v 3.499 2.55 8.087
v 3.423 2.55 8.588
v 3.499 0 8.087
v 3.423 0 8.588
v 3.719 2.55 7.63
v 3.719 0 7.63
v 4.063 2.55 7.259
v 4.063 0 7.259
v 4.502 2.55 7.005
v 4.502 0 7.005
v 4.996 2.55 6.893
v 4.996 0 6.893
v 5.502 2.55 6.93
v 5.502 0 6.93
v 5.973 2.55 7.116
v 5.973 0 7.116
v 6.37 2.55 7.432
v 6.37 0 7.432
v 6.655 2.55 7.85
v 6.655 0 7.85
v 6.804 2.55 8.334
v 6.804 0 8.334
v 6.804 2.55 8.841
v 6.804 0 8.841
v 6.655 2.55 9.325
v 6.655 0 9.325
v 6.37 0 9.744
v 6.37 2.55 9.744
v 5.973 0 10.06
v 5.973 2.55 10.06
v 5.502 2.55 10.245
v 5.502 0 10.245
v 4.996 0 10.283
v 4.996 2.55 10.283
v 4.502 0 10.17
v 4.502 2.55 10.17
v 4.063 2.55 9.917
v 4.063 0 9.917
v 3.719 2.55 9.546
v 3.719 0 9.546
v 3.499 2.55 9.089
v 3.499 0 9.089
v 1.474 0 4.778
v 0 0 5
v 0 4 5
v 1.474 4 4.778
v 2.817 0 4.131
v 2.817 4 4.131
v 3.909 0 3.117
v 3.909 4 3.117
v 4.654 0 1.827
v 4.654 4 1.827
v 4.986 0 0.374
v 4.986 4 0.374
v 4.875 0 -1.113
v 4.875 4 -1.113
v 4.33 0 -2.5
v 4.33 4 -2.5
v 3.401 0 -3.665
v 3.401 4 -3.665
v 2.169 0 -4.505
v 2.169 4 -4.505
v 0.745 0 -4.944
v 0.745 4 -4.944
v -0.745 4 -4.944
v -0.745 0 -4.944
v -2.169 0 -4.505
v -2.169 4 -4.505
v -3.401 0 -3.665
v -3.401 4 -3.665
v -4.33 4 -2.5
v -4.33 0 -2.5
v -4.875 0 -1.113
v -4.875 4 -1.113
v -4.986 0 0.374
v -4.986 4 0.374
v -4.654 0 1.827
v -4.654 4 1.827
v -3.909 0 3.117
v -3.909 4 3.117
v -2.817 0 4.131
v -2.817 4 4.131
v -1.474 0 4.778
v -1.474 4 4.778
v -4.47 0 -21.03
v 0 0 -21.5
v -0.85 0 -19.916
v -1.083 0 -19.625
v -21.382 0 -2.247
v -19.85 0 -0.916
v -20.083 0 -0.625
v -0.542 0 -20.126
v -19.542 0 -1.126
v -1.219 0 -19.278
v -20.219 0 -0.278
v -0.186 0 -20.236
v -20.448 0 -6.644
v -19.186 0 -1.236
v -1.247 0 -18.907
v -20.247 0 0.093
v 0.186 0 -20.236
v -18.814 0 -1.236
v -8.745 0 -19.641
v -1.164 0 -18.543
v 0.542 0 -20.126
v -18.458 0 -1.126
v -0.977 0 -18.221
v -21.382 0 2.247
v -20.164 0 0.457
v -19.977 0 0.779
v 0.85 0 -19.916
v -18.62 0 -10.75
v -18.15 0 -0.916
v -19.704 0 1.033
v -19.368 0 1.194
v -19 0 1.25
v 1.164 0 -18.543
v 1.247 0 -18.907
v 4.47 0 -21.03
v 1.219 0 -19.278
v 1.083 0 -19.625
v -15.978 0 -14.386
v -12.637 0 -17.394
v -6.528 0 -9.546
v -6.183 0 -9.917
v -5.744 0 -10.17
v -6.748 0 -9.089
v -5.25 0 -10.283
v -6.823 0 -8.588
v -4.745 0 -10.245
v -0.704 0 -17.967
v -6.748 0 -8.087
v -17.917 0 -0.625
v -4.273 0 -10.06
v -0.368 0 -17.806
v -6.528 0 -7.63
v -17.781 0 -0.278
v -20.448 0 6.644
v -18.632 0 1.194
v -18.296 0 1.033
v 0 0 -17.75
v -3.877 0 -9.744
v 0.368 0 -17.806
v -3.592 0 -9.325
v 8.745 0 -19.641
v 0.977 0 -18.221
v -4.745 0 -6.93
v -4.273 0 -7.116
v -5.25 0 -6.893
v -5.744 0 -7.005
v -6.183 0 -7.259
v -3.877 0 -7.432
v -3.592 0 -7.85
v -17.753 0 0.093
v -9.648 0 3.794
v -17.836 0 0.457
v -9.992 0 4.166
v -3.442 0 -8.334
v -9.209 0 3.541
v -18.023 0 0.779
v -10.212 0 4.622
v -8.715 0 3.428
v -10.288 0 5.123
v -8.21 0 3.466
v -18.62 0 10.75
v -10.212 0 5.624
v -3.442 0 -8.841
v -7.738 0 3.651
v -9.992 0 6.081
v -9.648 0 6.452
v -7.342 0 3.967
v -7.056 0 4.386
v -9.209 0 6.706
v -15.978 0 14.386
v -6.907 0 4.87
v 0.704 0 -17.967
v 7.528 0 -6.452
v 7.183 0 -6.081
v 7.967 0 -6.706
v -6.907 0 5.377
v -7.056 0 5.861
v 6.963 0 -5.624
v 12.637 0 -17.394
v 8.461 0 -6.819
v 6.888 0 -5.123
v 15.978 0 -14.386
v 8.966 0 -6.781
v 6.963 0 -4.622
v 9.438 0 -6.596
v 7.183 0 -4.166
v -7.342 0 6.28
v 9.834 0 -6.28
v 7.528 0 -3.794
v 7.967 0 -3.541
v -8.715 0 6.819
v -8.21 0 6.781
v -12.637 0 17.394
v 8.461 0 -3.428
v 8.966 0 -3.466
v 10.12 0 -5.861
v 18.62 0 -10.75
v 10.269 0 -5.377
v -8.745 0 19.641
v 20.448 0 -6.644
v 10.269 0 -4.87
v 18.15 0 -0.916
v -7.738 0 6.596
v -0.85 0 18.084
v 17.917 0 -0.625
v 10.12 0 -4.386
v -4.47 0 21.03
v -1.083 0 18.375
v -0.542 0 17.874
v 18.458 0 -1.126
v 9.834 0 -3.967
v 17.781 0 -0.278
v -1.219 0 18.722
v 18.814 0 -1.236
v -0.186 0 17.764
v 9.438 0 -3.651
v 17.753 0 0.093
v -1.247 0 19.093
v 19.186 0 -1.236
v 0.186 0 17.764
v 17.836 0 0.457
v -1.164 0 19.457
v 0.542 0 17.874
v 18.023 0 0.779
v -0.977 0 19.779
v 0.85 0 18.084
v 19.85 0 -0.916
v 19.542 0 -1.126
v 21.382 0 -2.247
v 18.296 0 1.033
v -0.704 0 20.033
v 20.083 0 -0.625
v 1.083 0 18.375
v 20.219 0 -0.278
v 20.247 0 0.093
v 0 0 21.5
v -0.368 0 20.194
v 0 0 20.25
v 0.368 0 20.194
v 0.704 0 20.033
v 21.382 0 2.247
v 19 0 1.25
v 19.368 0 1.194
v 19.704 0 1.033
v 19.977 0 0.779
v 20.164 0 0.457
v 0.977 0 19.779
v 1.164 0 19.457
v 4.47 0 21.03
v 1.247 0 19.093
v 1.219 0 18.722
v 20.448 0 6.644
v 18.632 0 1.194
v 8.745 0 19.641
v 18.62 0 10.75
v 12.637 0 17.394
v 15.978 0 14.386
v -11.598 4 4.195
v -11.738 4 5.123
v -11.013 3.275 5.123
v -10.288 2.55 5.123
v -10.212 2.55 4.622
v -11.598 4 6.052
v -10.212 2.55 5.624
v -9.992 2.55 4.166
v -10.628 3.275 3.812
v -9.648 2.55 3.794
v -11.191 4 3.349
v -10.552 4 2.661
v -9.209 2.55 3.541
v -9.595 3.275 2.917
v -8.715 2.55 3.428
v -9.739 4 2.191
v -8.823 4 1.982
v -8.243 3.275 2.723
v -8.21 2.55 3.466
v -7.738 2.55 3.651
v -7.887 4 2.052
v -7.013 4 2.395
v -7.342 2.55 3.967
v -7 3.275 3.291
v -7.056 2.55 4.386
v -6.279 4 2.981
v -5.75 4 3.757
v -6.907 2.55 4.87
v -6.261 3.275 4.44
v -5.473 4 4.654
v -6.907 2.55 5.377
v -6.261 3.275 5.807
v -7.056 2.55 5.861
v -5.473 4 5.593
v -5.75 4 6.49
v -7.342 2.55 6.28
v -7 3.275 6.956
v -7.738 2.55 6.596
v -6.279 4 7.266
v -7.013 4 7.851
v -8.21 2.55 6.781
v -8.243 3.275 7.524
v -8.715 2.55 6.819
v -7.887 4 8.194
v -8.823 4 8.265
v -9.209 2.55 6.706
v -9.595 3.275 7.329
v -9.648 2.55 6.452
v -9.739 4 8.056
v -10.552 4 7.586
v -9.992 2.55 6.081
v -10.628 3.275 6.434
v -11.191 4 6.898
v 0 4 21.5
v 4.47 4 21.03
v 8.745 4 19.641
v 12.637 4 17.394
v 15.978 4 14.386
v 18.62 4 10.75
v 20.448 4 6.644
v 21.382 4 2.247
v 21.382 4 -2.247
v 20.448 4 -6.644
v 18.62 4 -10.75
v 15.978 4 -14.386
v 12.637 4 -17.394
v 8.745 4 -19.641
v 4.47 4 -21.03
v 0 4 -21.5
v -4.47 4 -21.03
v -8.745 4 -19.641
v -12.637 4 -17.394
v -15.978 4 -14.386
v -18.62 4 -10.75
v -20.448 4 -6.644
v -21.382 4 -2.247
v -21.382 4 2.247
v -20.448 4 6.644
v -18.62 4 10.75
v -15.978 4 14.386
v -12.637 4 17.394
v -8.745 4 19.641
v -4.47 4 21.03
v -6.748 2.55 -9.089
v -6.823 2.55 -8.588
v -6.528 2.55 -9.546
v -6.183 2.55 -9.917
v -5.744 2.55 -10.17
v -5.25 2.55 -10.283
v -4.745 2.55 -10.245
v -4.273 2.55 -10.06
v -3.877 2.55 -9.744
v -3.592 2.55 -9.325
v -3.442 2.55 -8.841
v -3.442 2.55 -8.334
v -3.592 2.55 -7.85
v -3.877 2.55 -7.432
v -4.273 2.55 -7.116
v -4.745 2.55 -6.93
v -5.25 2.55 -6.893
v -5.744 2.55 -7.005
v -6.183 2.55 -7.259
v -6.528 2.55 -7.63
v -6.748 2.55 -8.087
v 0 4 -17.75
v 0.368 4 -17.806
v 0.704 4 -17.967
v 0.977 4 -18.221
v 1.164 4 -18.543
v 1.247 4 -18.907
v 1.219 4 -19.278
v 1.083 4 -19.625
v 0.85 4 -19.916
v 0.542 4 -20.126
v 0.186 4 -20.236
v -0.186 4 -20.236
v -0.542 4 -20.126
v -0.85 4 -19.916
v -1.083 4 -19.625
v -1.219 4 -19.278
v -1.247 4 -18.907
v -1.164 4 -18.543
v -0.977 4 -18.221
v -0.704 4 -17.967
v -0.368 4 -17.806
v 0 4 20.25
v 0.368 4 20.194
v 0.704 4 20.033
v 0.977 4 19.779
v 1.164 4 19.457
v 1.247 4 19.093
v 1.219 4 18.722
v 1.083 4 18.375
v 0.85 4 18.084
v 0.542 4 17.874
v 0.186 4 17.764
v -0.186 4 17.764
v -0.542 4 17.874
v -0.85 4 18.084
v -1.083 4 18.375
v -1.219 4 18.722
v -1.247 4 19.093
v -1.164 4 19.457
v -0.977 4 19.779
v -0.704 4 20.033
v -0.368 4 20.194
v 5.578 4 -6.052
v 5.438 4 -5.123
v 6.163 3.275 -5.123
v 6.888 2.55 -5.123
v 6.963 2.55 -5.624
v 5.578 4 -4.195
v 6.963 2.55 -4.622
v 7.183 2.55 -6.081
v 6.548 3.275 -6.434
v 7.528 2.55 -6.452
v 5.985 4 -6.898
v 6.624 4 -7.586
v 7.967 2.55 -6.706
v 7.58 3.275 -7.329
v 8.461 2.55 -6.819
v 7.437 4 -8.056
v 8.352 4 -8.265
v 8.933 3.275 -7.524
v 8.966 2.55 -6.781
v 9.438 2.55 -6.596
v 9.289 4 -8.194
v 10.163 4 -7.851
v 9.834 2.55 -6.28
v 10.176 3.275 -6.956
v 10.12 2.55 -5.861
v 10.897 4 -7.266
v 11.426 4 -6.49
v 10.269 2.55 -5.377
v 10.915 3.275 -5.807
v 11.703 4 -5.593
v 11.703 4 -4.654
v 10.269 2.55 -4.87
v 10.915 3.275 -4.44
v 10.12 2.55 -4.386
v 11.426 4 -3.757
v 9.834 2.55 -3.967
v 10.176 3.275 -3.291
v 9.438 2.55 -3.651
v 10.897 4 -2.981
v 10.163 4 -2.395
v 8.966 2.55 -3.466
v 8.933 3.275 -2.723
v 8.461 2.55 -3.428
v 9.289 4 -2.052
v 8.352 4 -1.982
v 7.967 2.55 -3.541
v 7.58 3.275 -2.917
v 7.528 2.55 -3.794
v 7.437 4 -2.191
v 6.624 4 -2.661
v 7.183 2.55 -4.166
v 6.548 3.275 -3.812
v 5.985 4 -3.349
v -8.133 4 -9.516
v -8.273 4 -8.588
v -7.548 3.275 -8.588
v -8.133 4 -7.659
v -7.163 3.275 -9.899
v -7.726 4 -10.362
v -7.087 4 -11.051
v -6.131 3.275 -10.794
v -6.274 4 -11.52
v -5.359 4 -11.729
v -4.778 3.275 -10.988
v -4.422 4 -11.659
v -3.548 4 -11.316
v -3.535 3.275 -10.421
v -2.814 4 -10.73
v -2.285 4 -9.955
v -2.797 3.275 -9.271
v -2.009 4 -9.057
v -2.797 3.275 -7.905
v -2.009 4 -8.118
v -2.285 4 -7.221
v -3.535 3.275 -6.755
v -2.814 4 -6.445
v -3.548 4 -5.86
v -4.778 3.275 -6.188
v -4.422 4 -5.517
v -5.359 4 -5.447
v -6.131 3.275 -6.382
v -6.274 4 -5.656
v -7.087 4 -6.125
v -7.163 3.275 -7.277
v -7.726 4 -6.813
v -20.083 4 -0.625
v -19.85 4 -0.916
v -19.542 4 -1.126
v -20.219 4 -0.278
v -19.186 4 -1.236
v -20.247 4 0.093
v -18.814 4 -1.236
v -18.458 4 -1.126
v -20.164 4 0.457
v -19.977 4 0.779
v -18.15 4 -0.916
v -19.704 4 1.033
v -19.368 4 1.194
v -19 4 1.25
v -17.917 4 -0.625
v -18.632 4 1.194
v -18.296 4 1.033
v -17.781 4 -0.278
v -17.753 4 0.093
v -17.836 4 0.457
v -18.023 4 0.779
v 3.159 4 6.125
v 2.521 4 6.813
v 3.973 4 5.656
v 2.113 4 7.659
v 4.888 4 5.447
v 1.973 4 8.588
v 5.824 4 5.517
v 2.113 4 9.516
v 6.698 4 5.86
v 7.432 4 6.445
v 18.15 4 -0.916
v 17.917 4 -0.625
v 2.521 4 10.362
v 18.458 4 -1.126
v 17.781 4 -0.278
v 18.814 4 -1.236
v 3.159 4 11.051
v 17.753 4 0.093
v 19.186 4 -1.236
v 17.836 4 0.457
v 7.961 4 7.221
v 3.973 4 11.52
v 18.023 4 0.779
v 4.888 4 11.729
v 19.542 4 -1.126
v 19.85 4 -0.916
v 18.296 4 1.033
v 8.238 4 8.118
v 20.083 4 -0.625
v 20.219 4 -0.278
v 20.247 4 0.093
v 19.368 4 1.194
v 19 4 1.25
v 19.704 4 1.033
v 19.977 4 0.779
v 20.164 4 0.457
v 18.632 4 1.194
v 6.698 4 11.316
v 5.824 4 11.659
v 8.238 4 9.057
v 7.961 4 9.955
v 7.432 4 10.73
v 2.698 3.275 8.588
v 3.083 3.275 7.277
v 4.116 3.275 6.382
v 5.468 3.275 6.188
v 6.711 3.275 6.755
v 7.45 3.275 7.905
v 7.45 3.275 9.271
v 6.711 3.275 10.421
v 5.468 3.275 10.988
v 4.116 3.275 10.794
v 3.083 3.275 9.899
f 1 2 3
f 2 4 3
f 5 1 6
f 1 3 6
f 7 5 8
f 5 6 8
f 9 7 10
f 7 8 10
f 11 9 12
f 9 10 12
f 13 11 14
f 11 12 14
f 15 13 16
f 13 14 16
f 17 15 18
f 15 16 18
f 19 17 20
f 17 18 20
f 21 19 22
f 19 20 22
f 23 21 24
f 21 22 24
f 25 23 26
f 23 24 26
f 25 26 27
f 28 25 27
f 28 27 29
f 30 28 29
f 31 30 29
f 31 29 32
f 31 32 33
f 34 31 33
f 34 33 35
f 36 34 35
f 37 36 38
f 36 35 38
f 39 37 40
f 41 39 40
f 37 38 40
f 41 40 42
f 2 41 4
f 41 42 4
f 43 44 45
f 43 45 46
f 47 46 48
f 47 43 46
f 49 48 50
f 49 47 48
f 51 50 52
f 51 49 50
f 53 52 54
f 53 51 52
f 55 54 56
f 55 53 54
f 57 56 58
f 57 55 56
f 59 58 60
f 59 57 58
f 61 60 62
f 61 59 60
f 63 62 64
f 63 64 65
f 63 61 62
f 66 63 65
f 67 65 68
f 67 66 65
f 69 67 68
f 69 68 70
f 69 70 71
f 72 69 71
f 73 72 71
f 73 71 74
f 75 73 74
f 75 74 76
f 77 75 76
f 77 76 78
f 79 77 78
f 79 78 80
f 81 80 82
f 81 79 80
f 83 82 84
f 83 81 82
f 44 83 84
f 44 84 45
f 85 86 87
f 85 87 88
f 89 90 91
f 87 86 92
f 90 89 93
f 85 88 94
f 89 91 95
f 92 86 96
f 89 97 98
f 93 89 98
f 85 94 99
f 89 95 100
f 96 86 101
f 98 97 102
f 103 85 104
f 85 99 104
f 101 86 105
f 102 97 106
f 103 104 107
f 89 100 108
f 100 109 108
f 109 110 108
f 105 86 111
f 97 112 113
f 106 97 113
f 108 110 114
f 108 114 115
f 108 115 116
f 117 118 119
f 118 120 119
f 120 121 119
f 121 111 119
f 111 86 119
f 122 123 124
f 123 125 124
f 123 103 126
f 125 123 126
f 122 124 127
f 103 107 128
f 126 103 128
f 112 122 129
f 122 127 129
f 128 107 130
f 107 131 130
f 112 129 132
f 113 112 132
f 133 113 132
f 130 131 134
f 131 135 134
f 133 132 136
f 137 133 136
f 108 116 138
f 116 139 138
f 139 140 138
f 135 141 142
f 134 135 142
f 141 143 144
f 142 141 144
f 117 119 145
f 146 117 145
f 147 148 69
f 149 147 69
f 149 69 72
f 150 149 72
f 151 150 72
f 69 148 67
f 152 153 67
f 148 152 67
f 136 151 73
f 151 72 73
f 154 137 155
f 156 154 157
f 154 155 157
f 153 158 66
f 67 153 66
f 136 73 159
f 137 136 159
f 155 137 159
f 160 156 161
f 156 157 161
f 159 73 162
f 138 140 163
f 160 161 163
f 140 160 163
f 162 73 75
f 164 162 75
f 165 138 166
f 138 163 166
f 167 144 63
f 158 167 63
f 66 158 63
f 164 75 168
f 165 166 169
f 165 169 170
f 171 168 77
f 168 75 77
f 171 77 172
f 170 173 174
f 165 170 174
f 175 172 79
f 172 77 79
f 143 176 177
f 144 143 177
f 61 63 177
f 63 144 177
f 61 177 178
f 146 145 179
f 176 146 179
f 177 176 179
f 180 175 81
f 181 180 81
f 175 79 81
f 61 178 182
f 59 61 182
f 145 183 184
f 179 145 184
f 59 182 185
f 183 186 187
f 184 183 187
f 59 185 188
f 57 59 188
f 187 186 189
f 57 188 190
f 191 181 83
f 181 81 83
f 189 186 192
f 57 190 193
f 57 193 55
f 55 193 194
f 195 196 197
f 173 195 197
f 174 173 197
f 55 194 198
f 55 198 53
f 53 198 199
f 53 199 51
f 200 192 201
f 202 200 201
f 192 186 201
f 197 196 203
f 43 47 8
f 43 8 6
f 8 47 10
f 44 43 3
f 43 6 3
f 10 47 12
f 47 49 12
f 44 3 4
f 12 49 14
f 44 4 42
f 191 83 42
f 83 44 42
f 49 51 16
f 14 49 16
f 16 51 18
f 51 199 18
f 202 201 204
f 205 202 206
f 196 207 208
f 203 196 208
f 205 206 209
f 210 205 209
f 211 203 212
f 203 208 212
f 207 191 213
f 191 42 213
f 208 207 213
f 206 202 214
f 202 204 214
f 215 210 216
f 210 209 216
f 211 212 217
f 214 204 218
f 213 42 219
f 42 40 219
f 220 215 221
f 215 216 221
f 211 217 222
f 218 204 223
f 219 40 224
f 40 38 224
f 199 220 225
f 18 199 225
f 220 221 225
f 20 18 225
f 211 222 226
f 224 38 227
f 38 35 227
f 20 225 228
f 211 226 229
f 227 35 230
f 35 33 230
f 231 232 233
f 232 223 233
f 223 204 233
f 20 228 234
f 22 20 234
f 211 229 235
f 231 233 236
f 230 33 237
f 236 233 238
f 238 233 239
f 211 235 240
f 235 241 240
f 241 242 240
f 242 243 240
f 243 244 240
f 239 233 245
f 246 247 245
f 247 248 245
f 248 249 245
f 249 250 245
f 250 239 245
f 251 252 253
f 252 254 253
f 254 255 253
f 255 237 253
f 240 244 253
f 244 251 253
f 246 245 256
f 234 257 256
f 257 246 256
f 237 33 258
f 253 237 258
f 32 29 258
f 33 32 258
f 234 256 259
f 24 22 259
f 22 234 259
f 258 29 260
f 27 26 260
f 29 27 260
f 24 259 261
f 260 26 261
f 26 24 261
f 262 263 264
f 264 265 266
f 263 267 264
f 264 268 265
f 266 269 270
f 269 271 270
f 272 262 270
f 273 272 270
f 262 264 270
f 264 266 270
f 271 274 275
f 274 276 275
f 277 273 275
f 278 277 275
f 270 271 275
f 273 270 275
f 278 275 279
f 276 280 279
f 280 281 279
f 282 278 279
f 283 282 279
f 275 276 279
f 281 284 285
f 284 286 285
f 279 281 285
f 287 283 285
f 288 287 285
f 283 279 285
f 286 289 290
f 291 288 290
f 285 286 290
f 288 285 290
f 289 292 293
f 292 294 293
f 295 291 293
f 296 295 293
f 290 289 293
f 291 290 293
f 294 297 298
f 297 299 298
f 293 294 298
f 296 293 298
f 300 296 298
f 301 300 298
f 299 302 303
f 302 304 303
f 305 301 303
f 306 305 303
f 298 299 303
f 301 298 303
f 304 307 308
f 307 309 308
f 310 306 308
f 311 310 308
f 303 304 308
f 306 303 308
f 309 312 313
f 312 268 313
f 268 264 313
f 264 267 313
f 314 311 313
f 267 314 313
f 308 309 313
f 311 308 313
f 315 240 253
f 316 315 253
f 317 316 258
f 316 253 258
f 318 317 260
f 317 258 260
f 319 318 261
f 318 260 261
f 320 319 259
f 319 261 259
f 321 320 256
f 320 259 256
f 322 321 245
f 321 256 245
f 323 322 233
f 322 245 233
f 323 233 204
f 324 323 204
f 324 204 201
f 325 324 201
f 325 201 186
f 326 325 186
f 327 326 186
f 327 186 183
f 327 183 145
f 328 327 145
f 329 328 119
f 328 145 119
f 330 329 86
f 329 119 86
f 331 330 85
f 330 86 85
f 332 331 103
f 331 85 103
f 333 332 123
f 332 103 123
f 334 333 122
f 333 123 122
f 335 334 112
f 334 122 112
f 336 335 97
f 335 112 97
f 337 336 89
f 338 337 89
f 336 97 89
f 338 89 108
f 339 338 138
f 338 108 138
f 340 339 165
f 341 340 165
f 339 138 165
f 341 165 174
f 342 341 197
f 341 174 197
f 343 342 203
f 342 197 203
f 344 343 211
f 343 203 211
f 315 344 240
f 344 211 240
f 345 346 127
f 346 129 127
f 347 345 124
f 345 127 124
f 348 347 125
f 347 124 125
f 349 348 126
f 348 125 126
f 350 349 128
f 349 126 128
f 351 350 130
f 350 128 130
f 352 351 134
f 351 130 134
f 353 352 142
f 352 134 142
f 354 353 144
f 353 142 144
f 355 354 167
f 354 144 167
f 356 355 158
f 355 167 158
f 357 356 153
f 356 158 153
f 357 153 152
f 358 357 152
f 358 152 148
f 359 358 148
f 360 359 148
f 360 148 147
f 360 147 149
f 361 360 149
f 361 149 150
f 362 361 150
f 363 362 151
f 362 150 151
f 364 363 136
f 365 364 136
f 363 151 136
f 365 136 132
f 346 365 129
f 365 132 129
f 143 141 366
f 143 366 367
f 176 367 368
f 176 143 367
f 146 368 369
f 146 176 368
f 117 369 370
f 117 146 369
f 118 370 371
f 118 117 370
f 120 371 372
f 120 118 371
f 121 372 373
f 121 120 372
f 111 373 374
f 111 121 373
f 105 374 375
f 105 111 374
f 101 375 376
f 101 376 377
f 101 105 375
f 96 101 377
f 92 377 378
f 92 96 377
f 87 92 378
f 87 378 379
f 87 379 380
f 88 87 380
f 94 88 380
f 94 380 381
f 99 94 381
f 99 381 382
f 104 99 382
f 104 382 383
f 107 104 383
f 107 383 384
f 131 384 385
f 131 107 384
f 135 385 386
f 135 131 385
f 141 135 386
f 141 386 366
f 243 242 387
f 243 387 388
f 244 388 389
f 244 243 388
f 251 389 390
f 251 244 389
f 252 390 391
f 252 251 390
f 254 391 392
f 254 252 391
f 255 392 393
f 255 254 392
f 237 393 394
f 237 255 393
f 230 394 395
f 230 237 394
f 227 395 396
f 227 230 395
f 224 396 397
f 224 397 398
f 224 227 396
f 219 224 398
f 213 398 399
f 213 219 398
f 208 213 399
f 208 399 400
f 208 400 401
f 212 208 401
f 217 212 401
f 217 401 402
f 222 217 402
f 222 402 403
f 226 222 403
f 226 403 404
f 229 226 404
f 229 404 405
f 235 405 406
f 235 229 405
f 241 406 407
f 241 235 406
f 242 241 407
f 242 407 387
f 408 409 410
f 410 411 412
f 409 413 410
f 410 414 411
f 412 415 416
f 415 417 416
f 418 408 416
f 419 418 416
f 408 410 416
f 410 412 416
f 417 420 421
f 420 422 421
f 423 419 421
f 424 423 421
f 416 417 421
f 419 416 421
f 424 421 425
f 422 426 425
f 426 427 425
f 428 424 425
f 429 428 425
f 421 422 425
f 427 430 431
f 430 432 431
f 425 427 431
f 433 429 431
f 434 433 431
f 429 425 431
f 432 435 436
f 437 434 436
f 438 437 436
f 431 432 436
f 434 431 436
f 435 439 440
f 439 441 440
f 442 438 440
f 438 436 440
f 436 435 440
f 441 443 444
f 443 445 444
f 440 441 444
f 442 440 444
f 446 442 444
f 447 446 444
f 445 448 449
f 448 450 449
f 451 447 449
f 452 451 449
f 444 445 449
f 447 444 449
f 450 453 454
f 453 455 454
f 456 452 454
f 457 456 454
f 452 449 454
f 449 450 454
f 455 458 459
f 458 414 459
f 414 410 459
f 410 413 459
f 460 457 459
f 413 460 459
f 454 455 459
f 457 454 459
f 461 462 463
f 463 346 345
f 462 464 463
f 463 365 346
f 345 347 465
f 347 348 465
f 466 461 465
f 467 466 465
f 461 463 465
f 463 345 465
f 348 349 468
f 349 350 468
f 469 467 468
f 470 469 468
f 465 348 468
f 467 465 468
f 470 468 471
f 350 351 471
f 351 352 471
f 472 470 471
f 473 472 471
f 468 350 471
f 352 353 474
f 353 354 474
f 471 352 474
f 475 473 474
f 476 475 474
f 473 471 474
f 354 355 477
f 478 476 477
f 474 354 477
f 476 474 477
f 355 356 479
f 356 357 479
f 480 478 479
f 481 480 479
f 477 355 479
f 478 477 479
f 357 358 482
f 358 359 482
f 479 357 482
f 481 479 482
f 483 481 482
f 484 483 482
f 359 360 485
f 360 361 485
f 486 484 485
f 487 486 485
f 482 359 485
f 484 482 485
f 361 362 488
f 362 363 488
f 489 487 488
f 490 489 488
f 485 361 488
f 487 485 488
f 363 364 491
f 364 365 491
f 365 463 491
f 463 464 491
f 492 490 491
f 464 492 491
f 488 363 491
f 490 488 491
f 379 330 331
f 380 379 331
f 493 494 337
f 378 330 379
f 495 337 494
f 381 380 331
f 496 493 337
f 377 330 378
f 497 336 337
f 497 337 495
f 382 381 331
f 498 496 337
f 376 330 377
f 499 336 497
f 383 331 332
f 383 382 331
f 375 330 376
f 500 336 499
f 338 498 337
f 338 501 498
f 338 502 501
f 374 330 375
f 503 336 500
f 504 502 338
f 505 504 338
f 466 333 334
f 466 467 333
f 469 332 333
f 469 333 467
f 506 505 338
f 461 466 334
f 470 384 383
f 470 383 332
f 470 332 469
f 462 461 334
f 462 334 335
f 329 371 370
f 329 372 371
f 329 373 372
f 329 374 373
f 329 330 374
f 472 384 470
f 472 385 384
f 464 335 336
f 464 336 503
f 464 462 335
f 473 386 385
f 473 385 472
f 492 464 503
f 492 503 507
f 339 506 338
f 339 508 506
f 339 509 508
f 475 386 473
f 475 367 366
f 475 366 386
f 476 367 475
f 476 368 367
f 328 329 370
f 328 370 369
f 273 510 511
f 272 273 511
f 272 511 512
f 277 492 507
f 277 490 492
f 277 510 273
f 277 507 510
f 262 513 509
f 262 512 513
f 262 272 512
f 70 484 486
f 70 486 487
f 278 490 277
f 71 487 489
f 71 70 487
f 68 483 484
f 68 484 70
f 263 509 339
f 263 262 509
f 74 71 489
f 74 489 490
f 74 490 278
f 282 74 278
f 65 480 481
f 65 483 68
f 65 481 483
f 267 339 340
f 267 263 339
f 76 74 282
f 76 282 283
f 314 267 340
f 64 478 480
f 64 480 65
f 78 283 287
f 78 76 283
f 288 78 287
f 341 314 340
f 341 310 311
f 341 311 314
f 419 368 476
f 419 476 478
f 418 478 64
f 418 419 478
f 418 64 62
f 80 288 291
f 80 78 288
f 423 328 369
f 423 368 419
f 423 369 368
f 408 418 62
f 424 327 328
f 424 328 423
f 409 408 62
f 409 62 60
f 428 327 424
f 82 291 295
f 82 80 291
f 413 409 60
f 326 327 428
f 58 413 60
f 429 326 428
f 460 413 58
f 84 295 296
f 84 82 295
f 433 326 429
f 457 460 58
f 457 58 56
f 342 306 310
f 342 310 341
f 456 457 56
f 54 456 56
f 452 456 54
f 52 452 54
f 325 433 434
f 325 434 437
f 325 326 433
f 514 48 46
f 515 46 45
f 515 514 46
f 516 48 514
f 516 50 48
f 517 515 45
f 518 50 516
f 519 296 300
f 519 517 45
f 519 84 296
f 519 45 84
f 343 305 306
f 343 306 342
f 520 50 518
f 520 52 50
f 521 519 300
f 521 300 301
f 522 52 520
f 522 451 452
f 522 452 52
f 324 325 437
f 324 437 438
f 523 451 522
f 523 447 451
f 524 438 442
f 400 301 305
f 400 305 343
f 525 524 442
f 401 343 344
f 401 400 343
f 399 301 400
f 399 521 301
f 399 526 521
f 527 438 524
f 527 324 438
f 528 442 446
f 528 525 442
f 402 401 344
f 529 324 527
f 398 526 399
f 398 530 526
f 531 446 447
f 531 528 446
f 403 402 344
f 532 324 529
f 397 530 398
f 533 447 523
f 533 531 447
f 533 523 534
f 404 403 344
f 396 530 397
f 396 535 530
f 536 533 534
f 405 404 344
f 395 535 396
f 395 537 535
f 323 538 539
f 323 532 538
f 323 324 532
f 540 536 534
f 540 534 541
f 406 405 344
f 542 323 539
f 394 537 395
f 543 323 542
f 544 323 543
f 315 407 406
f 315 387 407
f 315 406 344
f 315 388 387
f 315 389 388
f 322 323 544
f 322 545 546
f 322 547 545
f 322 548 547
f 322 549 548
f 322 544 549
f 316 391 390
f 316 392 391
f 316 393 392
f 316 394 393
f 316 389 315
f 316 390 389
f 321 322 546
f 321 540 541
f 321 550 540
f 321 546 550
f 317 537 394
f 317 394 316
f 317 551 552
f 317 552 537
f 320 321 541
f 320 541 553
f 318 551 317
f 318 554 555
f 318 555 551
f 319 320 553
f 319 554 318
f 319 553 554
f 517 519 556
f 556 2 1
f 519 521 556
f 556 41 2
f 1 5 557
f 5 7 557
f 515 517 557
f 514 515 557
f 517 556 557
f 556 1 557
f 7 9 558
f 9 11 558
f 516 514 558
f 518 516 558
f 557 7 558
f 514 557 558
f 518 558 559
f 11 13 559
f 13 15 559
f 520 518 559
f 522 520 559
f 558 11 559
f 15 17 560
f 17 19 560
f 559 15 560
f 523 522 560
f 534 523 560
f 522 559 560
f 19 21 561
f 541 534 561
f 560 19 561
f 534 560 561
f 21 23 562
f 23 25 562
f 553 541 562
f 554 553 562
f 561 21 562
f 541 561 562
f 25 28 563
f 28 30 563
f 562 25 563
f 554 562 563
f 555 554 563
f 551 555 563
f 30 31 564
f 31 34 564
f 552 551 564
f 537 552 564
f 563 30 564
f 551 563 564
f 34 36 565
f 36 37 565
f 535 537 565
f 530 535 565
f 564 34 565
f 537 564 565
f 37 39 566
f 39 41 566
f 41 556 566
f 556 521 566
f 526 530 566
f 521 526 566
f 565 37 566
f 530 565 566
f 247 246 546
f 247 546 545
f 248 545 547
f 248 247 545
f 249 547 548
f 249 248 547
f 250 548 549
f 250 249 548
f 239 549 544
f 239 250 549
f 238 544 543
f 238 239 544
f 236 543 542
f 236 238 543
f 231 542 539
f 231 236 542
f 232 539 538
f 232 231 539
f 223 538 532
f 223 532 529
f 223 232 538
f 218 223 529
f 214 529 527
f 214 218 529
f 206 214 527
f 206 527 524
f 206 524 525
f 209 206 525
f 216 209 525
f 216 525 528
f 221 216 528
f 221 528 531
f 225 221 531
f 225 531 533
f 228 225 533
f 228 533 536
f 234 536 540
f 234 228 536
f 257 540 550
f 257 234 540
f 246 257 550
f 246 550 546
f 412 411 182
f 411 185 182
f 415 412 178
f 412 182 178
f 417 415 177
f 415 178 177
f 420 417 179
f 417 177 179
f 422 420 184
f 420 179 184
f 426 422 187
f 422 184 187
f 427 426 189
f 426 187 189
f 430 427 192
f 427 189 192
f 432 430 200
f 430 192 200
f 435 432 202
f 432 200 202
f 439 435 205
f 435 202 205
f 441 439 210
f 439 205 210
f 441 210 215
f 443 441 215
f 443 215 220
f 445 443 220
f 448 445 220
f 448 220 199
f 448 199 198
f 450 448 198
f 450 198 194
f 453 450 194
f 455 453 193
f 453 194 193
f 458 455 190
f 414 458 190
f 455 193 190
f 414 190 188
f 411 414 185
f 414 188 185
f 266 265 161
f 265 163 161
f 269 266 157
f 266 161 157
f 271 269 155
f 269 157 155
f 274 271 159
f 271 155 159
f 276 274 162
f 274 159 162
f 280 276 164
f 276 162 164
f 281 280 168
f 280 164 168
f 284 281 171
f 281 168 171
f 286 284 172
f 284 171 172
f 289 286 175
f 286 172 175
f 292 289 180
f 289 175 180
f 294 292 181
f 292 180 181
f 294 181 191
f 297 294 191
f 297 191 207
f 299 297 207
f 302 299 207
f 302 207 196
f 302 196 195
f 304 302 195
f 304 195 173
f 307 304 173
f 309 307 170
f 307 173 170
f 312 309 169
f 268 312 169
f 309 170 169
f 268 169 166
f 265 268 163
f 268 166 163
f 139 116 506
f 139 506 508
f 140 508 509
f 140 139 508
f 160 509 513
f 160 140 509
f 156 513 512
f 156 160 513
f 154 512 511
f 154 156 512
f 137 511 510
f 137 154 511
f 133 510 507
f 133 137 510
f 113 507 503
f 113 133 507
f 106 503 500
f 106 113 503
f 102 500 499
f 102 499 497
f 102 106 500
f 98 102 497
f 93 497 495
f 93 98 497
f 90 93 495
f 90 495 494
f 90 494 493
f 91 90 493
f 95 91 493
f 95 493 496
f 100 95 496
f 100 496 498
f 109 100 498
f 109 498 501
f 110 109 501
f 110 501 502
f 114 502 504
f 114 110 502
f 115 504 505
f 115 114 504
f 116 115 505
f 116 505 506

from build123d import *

# Parameters (mm, degrees)
ESQUISSE1_R                                    = 21.5
ESQUISSE1_R_2                                  = 5
ESQUISSE1_R_3                                  = 1
ESQUISSE1_R_4                                  = 1.25
BOSS_EXTRU_1_DEPTH                             = 4
FRAISAGE_POUR_VIS_T_TE_FRAIS_E_M31_D           = 3.4
FRAISAGE_POUR_VIS_T_TE_FRAIS_E_M31_CSINK_D     = 6.3
FRAISAGE_POUR_VIS_T_TE_FRAIS_E_M31_CSINK_ANGLE = 90


with BuildPart() as part:
    # Esquisse1 → Boss.-Extru.1 (new body)
    with BuildSketch(Plane(origin=(0, 0, 0), x_dir=(1, 0, 0), z_dir=(0, 1, 0))):
        with Locations(Location((0, 0, 0), (0, 0, 270))):
            Circle(ESQUISSE1_R)
        with Locations(Location((0, 0, 0), (0, 0, 270))):
            Circle(ESQUISSE1_R_2, mode=Mode.SUBTRACT)
        with Locations(Location((-5.123344298, 8.587860223, 0), (0, 0, 270))):
            Circle(ESQUISSE1_R_3, mode=Mode.SUBTRACT)
        with Locations(Location((8.587860223, 5.123344298, 0), (0, 0, 270))):
            Circle(ESQUISSE1_R_3, mode=Mode.SUBTRACT)
        with Locations(Location((5.123344298, -8.587860223, 0), (0, 0, 270))):
            Circle(ESQUISSE1_R_3, mode=Mode.SUBTRACT)
        with Locations(Location((-8.587860223, -5.123344298, 0), (0, 0, 270))):
            Circle(ESQUISSE1_R_3, mode=Mode.SUBTRACT)
        with Locations(Location((0, 19, 0), (0, 0, 270))):
            Circle(ESQUISSE1_R_4, mode=Mode.SUBTRACT)
        with Locations(Location((19, 0, 0), (0, 0, 270))):
            Circle(ESQUISSE1_R_4, mode=Mode.SUBTRACT)
        with Locations(Location((0, -19, 0), (0, 0, 270))):
            Circle(ESQUISSE1_R_4, mode=Mode.SUBTRACT)
        with Locations(Location((-19, 0, 0), (0, 0, 270))):
            Circle(ESQUISSE1_R_4, mode=Mode.SUBTRACT)
    extrude(amount=BOSS_EXTRU_1_DEPTH)

    # Fraisage pour vis à tête fraisée M31 (through all)
    with Locations(Plane(origin=(0, 4, 0), x_dir=(1, 0, 0), z_dir=(0, 1, 0))):
        with Locations((-5.123344298, 8.587860223), (8.587860223, 5.123344298), (5.123344298, -8.587860223), (-8.587860223, -5.123344298)):
            CounterSinkHole(FRAISAGE_POUR_VIS_T_TE_FRAIS_E_M31_D / 2, FRAISAGE_POUR_VIS_T_TE_FRAIS_E_M31_CSINK_D / 2, counter_sink_angle=FRAISAGE_POUR_VIS_T_TE_FRAIS_E_M31_CSINK_ANGLE)


solid = part.part
